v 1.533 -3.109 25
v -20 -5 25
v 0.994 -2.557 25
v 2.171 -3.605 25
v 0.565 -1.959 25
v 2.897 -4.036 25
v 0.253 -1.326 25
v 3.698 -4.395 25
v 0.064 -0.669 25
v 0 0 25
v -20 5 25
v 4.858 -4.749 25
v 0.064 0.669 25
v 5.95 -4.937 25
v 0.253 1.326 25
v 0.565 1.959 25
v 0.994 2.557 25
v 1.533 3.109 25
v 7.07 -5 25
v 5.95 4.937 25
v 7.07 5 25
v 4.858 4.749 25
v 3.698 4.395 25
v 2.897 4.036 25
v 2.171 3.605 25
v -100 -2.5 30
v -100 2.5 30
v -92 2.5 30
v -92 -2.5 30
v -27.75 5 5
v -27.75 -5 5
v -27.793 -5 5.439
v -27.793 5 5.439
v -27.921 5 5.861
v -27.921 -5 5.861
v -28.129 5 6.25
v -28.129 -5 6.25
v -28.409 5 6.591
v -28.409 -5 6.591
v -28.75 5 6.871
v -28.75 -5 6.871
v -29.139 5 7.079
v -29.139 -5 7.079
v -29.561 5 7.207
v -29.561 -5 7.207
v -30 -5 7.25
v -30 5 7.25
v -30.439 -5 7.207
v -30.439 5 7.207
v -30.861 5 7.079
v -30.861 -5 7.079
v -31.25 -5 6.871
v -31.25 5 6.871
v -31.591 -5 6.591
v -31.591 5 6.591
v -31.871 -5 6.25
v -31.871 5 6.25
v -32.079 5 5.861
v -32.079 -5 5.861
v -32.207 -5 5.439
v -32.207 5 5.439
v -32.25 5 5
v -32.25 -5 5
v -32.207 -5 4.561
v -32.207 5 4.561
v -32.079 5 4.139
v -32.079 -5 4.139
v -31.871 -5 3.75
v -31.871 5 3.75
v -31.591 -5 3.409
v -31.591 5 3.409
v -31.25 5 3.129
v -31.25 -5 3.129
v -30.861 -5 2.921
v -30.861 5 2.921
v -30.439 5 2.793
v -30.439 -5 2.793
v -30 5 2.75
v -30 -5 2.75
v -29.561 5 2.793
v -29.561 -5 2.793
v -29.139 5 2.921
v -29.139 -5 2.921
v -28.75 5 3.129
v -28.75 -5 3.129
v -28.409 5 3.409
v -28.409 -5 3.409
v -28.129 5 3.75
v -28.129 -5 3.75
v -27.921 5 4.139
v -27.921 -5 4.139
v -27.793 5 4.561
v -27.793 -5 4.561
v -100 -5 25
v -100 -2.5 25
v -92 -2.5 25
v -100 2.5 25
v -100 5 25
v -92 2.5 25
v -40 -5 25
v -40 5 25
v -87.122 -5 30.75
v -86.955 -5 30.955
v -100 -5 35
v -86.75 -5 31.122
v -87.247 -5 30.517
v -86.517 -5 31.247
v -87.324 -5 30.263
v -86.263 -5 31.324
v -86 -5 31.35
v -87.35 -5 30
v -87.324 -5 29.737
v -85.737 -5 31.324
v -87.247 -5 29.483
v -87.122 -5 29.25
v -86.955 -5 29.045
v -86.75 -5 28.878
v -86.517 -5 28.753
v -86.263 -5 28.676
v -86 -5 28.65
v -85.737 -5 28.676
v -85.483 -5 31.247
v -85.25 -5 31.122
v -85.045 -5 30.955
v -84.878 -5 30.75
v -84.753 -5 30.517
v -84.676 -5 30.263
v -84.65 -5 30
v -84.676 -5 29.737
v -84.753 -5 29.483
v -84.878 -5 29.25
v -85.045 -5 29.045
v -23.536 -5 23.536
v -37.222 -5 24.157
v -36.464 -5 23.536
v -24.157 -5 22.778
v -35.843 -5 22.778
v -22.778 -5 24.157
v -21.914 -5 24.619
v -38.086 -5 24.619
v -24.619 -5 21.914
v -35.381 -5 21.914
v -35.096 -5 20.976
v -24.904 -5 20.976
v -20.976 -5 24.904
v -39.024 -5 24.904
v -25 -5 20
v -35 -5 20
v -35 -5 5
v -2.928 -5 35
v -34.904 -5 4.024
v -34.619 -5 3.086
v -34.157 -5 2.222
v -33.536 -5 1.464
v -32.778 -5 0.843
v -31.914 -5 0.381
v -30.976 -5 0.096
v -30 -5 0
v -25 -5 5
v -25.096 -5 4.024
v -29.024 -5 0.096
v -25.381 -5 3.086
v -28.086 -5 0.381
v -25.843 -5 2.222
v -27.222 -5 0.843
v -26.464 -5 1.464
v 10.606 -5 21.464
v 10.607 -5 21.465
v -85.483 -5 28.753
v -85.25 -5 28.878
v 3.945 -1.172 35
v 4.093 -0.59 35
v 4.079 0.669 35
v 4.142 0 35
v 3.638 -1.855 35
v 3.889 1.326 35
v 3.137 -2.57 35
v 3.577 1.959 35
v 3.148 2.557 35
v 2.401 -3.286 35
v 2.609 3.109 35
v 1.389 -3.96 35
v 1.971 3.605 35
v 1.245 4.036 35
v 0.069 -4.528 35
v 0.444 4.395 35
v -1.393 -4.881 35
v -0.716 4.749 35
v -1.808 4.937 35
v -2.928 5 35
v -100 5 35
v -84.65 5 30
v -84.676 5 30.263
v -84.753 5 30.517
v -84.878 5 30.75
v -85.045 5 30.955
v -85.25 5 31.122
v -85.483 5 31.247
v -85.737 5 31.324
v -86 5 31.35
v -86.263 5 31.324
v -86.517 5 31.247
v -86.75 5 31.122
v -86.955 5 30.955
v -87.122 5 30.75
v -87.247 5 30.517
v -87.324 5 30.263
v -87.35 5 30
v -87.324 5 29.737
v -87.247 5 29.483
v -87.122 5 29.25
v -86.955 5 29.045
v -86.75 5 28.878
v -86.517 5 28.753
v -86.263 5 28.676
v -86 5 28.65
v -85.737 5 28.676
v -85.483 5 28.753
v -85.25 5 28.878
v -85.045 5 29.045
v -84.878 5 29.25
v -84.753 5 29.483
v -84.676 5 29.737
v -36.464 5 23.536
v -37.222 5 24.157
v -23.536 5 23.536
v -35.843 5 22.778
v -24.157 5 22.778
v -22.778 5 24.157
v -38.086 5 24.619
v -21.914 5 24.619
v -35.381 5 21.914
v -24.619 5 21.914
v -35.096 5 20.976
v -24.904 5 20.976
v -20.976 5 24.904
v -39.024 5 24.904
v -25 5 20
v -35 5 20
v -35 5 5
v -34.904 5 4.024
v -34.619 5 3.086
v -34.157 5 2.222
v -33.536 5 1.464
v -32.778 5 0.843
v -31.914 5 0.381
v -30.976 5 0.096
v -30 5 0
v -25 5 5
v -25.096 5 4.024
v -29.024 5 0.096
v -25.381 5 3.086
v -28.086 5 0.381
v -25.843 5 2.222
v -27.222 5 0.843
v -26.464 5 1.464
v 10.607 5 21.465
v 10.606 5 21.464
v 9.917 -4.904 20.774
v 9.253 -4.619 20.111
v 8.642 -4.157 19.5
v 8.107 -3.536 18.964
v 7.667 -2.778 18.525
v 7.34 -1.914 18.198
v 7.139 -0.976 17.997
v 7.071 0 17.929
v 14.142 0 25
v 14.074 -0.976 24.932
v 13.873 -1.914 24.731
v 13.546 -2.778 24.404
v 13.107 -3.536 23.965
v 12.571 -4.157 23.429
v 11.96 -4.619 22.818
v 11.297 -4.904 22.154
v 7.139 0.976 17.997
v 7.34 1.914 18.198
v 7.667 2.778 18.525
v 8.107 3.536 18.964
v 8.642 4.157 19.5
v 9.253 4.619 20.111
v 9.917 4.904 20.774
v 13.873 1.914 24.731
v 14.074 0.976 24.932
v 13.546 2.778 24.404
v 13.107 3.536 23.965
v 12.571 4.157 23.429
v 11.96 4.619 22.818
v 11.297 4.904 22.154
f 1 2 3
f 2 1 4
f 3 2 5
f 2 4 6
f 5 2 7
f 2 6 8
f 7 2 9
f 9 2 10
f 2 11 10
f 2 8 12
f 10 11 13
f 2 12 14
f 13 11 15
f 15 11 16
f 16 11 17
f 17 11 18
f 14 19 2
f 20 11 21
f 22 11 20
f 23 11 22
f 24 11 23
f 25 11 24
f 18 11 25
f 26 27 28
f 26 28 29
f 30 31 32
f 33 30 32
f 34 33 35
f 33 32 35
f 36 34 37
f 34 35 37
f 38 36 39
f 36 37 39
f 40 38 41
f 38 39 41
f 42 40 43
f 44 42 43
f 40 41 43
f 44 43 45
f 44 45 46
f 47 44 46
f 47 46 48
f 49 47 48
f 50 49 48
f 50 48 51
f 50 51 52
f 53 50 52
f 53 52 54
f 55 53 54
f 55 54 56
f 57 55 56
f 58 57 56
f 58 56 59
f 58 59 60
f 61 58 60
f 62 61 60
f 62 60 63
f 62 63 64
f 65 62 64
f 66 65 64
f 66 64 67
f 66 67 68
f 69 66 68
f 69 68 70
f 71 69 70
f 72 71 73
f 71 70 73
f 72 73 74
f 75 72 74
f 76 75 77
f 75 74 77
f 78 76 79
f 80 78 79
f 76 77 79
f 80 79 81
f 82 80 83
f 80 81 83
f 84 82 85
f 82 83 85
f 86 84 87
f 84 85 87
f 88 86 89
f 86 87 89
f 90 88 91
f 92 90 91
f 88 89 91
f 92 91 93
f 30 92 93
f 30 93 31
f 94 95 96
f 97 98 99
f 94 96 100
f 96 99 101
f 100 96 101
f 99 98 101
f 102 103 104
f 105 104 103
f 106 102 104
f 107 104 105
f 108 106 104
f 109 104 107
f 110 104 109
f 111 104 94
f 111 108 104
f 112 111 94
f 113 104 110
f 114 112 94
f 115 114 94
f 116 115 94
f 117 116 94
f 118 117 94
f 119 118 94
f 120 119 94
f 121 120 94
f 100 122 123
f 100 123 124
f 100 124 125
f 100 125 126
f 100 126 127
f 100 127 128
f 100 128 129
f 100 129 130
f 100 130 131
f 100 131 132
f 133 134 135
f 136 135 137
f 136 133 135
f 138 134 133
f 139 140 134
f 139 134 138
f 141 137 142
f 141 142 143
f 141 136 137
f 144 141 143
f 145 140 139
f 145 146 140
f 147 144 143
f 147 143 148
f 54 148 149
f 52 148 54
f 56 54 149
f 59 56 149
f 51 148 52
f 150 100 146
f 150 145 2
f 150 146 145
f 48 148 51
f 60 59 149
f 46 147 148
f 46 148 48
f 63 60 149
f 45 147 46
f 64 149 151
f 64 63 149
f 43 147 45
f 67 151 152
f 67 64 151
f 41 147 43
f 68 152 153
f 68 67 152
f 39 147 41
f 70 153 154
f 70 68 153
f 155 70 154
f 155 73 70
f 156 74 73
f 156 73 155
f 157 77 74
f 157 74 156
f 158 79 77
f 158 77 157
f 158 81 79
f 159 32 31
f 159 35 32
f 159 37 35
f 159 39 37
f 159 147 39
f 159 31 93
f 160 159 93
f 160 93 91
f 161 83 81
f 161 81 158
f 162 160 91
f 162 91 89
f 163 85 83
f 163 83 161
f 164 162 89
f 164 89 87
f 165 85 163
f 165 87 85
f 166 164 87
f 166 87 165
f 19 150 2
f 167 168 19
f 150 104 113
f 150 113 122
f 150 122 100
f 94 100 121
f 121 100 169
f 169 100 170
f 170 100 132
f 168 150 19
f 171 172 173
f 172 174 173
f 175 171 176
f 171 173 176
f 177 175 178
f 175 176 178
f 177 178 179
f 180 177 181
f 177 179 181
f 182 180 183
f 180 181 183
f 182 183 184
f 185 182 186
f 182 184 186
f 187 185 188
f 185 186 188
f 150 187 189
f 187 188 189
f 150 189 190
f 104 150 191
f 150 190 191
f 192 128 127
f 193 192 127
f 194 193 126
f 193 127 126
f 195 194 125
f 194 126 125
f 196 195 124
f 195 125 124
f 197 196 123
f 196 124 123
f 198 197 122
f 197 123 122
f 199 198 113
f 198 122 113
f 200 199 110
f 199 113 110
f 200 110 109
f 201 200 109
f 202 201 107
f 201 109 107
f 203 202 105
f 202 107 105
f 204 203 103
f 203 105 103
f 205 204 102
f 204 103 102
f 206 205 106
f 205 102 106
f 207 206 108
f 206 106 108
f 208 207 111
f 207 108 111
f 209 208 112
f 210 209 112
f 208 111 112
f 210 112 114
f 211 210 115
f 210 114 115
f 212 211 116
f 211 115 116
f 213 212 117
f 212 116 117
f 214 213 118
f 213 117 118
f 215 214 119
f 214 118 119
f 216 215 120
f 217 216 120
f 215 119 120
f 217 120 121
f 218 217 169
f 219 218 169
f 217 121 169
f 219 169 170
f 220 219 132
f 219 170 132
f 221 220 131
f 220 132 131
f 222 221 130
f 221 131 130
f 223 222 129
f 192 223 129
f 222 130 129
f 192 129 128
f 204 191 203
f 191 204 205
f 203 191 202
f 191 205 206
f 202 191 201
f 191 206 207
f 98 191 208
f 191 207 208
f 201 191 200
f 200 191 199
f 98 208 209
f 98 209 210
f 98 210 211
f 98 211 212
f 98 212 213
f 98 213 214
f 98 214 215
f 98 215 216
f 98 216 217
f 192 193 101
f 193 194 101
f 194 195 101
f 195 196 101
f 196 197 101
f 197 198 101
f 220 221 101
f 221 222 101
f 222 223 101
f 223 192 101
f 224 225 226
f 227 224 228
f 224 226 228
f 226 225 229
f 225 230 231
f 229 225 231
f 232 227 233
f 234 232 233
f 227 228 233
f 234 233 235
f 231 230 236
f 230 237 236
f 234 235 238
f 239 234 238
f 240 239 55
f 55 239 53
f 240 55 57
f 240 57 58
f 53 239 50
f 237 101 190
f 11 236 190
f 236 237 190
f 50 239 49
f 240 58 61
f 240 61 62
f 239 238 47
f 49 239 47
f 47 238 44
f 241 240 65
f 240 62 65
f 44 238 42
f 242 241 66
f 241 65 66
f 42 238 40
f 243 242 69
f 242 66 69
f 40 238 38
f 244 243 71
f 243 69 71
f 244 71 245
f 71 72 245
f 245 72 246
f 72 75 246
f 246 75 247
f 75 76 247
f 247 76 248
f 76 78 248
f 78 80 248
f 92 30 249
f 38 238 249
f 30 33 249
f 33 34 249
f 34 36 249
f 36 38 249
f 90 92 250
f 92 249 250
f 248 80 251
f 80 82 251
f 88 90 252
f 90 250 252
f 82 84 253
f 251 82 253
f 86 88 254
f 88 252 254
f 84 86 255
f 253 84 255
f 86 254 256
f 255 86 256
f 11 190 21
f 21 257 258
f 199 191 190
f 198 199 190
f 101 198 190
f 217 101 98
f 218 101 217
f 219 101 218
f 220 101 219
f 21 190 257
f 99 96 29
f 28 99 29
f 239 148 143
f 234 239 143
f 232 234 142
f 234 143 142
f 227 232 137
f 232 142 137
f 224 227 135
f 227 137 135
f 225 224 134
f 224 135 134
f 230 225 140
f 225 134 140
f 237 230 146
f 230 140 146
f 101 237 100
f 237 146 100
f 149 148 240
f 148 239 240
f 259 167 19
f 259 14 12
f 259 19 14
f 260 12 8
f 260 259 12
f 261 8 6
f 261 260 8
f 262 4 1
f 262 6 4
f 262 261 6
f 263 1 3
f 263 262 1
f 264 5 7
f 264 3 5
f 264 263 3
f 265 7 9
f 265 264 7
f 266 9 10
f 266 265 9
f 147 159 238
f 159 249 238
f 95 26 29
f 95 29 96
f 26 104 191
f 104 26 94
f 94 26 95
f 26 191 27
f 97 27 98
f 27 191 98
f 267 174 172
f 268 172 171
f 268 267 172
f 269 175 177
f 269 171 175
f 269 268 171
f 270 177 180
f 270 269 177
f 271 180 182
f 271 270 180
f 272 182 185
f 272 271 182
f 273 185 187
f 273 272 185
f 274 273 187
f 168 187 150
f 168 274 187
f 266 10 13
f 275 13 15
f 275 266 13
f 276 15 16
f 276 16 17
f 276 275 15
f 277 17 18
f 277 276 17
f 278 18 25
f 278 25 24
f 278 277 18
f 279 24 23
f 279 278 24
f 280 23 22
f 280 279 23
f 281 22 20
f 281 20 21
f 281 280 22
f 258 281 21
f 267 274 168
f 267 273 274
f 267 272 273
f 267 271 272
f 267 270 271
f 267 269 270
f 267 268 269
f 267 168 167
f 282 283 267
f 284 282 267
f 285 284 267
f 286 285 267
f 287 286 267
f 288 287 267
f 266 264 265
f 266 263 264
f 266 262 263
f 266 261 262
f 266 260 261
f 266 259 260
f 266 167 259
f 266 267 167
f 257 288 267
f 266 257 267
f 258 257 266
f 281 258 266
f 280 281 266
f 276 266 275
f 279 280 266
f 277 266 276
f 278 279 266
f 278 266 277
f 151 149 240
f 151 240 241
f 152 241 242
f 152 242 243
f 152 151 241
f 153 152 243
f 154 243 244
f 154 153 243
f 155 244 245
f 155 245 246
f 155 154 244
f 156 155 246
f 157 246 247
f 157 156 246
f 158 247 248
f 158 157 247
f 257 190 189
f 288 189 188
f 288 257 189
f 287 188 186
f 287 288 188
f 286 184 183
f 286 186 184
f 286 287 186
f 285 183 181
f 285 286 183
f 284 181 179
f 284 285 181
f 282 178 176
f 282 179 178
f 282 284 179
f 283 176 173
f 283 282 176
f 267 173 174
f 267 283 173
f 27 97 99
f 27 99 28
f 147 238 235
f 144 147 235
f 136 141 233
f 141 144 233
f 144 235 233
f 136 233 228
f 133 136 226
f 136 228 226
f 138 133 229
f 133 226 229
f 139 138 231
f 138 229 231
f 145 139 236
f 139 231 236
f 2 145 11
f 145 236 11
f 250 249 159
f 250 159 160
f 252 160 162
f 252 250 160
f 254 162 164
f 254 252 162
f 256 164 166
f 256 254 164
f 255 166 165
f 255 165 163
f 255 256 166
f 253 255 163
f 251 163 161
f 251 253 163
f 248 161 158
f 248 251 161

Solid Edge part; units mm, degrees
sketch "Sketch1" plane through (0, 0, 0) normal (0, -1, 0) x (1, 0, 0)
  line L0 (0, 25) -> (7.0711, 17.9289)
  line L1 (14.1421, 25) -> (7.0711, 17.9289)
  line L2 (4.1421, 35) -> (14.1421, 25)
  line L3 (4.1421, 35) -> (-100, 35)
  line L4 (-100, 35) -> (-100, 25)
  line L5 (-100, 25) -> (-35, 25)
  line L6 (-35, 25) -> (-35, 0)
  line L7 (-35, 0) -> (-25, 0)
  line L8 (-25, 0) -> (-25, 25)
  line L9 (-25, 25) -> (0, 25)
extrude "Protrusion1" add sketch "Sketch1" along normal mid plane 10
fillet "Round_1" radius 5 4 edges at (3.5355, -5, 21.4645) (3.5355, 5, 21.4645) (9.1421, 5, 30) (9.1421, -5, 30)
sketch "Sketch2" plane through (-61.4645, -5, 24) normal (0, -1, 0) x (1, 0, 0)
  circle A0 centre (31.4645, -19) radius 2.25
extrude "ExtrudedCutout_1" cut sketch "Sketch2" along normal mid plane 69.4908
fillet "Round_2" radius 5 4 edges at (-25, 0, 0) (-35, 0, 0) (-25, 0, 25) (-35, 0, 25)
sketch "Sketch3" plane through (-100, 0, 43) normal (-1, 0, 0) x (0, 0, -1)
  line L0 (18, -2.5) -> (13, -2.5)
  line L1 (13, -2.5) -> (13, 2.5)
  line L2 (13, 2.5) -> (18, 2.5)
  line L3 (18, 2.5) -> (18, -2.5)
extrude "ExtrudedCutout_2" cut sketch "Sketch3" against normal blind 8
sketch "Sketch4" plane through (0, 0, 0) normal (0, -1, 0) x (1, 0, 0)
  circle A0 centre (-86, 30) radius 1.35
extrude "ExtrudedCutout_3" cut sketch "Sketch4" along normal mid plane 29.2691
properties material "PVC"
